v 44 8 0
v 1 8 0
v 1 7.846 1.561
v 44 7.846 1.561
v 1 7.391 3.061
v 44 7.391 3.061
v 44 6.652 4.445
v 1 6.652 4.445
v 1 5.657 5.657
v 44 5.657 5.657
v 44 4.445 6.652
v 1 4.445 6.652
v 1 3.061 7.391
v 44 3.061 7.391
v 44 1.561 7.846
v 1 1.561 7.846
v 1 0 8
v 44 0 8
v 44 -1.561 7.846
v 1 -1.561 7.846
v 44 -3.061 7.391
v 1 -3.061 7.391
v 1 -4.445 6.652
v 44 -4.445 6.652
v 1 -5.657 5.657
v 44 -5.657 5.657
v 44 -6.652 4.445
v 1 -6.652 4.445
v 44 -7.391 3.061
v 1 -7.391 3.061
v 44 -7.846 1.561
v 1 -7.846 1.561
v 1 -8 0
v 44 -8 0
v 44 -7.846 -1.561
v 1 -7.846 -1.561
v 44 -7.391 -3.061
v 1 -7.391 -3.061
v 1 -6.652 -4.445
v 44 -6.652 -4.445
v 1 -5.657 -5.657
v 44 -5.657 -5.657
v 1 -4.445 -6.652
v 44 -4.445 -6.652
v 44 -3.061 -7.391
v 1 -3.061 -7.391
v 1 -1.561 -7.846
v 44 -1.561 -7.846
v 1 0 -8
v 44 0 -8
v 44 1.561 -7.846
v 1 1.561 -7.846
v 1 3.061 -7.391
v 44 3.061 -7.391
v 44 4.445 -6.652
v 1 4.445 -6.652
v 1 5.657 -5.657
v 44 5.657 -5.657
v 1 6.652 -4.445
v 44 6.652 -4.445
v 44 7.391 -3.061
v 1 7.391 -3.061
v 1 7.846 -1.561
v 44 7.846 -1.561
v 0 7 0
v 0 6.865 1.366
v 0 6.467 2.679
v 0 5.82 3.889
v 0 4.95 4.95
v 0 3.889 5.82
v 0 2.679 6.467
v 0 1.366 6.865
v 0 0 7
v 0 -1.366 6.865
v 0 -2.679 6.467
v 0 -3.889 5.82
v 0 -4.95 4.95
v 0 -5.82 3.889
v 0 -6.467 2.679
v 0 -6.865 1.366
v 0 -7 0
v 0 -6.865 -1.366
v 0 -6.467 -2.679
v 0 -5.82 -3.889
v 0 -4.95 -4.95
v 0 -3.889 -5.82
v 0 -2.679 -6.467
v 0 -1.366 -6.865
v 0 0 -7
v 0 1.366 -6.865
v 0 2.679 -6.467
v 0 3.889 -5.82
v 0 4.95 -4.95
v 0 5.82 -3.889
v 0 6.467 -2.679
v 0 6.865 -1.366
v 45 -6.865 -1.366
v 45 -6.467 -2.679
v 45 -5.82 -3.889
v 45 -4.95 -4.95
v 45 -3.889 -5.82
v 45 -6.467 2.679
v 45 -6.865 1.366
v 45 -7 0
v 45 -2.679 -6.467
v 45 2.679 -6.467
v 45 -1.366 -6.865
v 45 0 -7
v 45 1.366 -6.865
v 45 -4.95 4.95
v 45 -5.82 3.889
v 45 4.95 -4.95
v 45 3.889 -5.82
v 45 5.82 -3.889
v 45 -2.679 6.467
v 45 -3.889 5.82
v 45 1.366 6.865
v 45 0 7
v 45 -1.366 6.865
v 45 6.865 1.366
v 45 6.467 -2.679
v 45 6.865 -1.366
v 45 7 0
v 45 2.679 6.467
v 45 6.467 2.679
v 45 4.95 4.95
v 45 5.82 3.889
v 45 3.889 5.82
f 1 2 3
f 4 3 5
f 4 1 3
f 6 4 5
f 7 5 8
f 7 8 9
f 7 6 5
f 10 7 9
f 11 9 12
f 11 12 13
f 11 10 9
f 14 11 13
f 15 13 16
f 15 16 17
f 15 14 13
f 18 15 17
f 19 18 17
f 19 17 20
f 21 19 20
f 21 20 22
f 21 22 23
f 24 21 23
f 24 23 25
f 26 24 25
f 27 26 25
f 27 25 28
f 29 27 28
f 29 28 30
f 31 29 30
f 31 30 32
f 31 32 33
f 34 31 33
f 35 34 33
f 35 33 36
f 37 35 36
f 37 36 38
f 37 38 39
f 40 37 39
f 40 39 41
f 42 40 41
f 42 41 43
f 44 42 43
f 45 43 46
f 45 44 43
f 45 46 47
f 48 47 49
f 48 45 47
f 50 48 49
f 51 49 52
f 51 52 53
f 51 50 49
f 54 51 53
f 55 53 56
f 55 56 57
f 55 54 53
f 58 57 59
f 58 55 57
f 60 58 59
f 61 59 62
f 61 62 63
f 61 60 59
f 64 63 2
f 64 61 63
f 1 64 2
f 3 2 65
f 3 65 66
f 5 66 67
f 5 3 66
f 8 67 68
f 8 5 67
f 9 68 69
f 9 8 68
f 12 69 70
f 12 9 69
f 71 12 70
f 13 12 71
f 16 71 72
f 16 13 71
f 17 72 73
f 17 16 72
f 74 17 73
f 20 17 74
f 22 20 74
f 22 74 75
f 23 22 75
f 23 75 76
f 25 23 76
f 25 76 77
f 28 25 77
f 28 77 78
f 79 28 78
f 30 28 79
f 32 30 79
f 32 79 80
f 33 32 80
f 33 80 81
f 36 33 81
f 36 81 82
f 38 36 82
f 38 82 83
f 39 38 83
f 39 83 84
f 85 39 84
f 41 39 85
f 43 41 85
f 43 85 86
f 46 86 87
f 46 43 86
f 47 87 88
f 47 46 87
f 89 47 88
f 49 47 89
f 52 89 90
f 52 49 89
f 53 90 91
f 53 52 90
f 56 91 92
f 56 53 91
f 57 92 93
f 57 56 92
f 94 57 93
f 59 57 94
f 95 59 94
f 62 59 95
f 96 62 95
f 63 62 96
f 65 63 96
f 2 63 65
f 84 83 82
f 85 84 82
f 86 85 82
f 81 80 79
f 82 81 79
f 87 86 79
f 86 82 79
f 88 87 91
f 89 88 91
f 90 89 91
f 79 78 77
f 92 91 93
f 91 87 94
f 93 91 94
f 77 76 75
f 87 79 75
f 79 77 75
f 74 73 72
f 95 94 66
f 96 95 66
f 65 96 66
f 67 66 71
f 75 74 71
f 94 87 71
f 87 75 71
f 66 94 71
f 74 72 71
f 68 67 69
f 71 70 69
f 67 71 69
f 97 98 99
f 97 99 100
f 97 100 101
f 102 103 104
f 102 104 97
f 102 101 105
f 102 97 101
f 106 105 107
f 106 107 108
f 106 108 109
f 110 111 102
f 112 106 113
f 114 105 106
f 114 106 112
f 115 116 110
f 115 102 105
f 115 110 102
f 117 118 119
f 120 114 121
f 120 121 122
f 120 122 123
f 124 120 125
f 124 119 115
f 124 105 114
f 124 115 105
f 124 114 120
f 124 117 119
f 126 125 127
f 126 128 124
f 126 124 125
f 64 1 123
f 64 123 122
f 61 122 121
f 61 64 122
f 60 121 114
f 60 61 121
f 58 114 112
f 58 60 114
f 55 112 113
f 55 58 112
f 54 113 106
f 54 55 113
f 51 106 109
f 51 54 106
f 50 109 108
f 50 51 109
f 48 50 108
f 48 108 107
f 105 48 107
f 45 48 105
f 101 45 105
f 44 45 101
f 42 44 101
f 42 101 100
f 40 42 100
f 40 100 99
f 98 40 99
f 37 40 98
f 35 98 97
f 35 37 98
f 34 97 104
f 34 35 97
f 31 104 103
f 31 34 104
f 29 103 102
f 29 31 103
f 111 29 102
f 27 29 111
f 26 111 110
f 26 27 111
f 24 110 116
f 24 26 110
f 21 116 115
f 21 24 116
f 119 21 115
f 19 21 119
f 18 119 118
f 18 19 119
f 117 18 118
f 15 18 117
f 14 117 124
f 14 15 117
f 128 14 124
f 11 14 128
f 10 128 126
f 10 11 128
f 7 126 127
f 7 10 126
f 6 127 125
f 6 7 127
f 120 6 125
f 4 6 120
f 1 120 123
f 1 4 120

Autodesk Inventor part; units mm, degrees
ref_plane "YZ Plane" through (0, 0, 0) normal (1, 0, 0) x (0, 1, 0)
ref_plane "XZ Plane" through (0, 0, 0) normal (0, 1, 0) x (-1, 0, 0)
ref_plane "XY Plane" through (0, 0, 0) normal (0, 0, 1) x (1, 0, 0)
sketch "Эскиз1" plane through (0, 0, 0) normal (0, 0, 1) x (1, 0, 0)
  line L0 (0, 0) -> (0, 8)
  line L1 (0, 8) -> (45, 8)
  line L2 (45, 8) -> (45, 0)
  line L3 (0, 0) -> (45, 0)
  dimension "d0" = 45
  dimension "d1" = 16
revolve "Вращение1" add sketch "Эскиз1" angle 360 about axis through (0, 0, 0) along (1, 0, 0)
thread "Резьба1" size "M16x2" class "6g" standard "ANSI Metric M Profile" length 20
chamfer "Фаска1" distance 1 angle 45 1 edges at (45, -8, 0)
thread "Резьба2" size "M16x2" class "6g" standard "ANSI Metric M Profile" length 14
chamfer "Фаска2" distance 1 angle 45 1 edges at (0, -8, 0)
properties part number "Шпилька"
